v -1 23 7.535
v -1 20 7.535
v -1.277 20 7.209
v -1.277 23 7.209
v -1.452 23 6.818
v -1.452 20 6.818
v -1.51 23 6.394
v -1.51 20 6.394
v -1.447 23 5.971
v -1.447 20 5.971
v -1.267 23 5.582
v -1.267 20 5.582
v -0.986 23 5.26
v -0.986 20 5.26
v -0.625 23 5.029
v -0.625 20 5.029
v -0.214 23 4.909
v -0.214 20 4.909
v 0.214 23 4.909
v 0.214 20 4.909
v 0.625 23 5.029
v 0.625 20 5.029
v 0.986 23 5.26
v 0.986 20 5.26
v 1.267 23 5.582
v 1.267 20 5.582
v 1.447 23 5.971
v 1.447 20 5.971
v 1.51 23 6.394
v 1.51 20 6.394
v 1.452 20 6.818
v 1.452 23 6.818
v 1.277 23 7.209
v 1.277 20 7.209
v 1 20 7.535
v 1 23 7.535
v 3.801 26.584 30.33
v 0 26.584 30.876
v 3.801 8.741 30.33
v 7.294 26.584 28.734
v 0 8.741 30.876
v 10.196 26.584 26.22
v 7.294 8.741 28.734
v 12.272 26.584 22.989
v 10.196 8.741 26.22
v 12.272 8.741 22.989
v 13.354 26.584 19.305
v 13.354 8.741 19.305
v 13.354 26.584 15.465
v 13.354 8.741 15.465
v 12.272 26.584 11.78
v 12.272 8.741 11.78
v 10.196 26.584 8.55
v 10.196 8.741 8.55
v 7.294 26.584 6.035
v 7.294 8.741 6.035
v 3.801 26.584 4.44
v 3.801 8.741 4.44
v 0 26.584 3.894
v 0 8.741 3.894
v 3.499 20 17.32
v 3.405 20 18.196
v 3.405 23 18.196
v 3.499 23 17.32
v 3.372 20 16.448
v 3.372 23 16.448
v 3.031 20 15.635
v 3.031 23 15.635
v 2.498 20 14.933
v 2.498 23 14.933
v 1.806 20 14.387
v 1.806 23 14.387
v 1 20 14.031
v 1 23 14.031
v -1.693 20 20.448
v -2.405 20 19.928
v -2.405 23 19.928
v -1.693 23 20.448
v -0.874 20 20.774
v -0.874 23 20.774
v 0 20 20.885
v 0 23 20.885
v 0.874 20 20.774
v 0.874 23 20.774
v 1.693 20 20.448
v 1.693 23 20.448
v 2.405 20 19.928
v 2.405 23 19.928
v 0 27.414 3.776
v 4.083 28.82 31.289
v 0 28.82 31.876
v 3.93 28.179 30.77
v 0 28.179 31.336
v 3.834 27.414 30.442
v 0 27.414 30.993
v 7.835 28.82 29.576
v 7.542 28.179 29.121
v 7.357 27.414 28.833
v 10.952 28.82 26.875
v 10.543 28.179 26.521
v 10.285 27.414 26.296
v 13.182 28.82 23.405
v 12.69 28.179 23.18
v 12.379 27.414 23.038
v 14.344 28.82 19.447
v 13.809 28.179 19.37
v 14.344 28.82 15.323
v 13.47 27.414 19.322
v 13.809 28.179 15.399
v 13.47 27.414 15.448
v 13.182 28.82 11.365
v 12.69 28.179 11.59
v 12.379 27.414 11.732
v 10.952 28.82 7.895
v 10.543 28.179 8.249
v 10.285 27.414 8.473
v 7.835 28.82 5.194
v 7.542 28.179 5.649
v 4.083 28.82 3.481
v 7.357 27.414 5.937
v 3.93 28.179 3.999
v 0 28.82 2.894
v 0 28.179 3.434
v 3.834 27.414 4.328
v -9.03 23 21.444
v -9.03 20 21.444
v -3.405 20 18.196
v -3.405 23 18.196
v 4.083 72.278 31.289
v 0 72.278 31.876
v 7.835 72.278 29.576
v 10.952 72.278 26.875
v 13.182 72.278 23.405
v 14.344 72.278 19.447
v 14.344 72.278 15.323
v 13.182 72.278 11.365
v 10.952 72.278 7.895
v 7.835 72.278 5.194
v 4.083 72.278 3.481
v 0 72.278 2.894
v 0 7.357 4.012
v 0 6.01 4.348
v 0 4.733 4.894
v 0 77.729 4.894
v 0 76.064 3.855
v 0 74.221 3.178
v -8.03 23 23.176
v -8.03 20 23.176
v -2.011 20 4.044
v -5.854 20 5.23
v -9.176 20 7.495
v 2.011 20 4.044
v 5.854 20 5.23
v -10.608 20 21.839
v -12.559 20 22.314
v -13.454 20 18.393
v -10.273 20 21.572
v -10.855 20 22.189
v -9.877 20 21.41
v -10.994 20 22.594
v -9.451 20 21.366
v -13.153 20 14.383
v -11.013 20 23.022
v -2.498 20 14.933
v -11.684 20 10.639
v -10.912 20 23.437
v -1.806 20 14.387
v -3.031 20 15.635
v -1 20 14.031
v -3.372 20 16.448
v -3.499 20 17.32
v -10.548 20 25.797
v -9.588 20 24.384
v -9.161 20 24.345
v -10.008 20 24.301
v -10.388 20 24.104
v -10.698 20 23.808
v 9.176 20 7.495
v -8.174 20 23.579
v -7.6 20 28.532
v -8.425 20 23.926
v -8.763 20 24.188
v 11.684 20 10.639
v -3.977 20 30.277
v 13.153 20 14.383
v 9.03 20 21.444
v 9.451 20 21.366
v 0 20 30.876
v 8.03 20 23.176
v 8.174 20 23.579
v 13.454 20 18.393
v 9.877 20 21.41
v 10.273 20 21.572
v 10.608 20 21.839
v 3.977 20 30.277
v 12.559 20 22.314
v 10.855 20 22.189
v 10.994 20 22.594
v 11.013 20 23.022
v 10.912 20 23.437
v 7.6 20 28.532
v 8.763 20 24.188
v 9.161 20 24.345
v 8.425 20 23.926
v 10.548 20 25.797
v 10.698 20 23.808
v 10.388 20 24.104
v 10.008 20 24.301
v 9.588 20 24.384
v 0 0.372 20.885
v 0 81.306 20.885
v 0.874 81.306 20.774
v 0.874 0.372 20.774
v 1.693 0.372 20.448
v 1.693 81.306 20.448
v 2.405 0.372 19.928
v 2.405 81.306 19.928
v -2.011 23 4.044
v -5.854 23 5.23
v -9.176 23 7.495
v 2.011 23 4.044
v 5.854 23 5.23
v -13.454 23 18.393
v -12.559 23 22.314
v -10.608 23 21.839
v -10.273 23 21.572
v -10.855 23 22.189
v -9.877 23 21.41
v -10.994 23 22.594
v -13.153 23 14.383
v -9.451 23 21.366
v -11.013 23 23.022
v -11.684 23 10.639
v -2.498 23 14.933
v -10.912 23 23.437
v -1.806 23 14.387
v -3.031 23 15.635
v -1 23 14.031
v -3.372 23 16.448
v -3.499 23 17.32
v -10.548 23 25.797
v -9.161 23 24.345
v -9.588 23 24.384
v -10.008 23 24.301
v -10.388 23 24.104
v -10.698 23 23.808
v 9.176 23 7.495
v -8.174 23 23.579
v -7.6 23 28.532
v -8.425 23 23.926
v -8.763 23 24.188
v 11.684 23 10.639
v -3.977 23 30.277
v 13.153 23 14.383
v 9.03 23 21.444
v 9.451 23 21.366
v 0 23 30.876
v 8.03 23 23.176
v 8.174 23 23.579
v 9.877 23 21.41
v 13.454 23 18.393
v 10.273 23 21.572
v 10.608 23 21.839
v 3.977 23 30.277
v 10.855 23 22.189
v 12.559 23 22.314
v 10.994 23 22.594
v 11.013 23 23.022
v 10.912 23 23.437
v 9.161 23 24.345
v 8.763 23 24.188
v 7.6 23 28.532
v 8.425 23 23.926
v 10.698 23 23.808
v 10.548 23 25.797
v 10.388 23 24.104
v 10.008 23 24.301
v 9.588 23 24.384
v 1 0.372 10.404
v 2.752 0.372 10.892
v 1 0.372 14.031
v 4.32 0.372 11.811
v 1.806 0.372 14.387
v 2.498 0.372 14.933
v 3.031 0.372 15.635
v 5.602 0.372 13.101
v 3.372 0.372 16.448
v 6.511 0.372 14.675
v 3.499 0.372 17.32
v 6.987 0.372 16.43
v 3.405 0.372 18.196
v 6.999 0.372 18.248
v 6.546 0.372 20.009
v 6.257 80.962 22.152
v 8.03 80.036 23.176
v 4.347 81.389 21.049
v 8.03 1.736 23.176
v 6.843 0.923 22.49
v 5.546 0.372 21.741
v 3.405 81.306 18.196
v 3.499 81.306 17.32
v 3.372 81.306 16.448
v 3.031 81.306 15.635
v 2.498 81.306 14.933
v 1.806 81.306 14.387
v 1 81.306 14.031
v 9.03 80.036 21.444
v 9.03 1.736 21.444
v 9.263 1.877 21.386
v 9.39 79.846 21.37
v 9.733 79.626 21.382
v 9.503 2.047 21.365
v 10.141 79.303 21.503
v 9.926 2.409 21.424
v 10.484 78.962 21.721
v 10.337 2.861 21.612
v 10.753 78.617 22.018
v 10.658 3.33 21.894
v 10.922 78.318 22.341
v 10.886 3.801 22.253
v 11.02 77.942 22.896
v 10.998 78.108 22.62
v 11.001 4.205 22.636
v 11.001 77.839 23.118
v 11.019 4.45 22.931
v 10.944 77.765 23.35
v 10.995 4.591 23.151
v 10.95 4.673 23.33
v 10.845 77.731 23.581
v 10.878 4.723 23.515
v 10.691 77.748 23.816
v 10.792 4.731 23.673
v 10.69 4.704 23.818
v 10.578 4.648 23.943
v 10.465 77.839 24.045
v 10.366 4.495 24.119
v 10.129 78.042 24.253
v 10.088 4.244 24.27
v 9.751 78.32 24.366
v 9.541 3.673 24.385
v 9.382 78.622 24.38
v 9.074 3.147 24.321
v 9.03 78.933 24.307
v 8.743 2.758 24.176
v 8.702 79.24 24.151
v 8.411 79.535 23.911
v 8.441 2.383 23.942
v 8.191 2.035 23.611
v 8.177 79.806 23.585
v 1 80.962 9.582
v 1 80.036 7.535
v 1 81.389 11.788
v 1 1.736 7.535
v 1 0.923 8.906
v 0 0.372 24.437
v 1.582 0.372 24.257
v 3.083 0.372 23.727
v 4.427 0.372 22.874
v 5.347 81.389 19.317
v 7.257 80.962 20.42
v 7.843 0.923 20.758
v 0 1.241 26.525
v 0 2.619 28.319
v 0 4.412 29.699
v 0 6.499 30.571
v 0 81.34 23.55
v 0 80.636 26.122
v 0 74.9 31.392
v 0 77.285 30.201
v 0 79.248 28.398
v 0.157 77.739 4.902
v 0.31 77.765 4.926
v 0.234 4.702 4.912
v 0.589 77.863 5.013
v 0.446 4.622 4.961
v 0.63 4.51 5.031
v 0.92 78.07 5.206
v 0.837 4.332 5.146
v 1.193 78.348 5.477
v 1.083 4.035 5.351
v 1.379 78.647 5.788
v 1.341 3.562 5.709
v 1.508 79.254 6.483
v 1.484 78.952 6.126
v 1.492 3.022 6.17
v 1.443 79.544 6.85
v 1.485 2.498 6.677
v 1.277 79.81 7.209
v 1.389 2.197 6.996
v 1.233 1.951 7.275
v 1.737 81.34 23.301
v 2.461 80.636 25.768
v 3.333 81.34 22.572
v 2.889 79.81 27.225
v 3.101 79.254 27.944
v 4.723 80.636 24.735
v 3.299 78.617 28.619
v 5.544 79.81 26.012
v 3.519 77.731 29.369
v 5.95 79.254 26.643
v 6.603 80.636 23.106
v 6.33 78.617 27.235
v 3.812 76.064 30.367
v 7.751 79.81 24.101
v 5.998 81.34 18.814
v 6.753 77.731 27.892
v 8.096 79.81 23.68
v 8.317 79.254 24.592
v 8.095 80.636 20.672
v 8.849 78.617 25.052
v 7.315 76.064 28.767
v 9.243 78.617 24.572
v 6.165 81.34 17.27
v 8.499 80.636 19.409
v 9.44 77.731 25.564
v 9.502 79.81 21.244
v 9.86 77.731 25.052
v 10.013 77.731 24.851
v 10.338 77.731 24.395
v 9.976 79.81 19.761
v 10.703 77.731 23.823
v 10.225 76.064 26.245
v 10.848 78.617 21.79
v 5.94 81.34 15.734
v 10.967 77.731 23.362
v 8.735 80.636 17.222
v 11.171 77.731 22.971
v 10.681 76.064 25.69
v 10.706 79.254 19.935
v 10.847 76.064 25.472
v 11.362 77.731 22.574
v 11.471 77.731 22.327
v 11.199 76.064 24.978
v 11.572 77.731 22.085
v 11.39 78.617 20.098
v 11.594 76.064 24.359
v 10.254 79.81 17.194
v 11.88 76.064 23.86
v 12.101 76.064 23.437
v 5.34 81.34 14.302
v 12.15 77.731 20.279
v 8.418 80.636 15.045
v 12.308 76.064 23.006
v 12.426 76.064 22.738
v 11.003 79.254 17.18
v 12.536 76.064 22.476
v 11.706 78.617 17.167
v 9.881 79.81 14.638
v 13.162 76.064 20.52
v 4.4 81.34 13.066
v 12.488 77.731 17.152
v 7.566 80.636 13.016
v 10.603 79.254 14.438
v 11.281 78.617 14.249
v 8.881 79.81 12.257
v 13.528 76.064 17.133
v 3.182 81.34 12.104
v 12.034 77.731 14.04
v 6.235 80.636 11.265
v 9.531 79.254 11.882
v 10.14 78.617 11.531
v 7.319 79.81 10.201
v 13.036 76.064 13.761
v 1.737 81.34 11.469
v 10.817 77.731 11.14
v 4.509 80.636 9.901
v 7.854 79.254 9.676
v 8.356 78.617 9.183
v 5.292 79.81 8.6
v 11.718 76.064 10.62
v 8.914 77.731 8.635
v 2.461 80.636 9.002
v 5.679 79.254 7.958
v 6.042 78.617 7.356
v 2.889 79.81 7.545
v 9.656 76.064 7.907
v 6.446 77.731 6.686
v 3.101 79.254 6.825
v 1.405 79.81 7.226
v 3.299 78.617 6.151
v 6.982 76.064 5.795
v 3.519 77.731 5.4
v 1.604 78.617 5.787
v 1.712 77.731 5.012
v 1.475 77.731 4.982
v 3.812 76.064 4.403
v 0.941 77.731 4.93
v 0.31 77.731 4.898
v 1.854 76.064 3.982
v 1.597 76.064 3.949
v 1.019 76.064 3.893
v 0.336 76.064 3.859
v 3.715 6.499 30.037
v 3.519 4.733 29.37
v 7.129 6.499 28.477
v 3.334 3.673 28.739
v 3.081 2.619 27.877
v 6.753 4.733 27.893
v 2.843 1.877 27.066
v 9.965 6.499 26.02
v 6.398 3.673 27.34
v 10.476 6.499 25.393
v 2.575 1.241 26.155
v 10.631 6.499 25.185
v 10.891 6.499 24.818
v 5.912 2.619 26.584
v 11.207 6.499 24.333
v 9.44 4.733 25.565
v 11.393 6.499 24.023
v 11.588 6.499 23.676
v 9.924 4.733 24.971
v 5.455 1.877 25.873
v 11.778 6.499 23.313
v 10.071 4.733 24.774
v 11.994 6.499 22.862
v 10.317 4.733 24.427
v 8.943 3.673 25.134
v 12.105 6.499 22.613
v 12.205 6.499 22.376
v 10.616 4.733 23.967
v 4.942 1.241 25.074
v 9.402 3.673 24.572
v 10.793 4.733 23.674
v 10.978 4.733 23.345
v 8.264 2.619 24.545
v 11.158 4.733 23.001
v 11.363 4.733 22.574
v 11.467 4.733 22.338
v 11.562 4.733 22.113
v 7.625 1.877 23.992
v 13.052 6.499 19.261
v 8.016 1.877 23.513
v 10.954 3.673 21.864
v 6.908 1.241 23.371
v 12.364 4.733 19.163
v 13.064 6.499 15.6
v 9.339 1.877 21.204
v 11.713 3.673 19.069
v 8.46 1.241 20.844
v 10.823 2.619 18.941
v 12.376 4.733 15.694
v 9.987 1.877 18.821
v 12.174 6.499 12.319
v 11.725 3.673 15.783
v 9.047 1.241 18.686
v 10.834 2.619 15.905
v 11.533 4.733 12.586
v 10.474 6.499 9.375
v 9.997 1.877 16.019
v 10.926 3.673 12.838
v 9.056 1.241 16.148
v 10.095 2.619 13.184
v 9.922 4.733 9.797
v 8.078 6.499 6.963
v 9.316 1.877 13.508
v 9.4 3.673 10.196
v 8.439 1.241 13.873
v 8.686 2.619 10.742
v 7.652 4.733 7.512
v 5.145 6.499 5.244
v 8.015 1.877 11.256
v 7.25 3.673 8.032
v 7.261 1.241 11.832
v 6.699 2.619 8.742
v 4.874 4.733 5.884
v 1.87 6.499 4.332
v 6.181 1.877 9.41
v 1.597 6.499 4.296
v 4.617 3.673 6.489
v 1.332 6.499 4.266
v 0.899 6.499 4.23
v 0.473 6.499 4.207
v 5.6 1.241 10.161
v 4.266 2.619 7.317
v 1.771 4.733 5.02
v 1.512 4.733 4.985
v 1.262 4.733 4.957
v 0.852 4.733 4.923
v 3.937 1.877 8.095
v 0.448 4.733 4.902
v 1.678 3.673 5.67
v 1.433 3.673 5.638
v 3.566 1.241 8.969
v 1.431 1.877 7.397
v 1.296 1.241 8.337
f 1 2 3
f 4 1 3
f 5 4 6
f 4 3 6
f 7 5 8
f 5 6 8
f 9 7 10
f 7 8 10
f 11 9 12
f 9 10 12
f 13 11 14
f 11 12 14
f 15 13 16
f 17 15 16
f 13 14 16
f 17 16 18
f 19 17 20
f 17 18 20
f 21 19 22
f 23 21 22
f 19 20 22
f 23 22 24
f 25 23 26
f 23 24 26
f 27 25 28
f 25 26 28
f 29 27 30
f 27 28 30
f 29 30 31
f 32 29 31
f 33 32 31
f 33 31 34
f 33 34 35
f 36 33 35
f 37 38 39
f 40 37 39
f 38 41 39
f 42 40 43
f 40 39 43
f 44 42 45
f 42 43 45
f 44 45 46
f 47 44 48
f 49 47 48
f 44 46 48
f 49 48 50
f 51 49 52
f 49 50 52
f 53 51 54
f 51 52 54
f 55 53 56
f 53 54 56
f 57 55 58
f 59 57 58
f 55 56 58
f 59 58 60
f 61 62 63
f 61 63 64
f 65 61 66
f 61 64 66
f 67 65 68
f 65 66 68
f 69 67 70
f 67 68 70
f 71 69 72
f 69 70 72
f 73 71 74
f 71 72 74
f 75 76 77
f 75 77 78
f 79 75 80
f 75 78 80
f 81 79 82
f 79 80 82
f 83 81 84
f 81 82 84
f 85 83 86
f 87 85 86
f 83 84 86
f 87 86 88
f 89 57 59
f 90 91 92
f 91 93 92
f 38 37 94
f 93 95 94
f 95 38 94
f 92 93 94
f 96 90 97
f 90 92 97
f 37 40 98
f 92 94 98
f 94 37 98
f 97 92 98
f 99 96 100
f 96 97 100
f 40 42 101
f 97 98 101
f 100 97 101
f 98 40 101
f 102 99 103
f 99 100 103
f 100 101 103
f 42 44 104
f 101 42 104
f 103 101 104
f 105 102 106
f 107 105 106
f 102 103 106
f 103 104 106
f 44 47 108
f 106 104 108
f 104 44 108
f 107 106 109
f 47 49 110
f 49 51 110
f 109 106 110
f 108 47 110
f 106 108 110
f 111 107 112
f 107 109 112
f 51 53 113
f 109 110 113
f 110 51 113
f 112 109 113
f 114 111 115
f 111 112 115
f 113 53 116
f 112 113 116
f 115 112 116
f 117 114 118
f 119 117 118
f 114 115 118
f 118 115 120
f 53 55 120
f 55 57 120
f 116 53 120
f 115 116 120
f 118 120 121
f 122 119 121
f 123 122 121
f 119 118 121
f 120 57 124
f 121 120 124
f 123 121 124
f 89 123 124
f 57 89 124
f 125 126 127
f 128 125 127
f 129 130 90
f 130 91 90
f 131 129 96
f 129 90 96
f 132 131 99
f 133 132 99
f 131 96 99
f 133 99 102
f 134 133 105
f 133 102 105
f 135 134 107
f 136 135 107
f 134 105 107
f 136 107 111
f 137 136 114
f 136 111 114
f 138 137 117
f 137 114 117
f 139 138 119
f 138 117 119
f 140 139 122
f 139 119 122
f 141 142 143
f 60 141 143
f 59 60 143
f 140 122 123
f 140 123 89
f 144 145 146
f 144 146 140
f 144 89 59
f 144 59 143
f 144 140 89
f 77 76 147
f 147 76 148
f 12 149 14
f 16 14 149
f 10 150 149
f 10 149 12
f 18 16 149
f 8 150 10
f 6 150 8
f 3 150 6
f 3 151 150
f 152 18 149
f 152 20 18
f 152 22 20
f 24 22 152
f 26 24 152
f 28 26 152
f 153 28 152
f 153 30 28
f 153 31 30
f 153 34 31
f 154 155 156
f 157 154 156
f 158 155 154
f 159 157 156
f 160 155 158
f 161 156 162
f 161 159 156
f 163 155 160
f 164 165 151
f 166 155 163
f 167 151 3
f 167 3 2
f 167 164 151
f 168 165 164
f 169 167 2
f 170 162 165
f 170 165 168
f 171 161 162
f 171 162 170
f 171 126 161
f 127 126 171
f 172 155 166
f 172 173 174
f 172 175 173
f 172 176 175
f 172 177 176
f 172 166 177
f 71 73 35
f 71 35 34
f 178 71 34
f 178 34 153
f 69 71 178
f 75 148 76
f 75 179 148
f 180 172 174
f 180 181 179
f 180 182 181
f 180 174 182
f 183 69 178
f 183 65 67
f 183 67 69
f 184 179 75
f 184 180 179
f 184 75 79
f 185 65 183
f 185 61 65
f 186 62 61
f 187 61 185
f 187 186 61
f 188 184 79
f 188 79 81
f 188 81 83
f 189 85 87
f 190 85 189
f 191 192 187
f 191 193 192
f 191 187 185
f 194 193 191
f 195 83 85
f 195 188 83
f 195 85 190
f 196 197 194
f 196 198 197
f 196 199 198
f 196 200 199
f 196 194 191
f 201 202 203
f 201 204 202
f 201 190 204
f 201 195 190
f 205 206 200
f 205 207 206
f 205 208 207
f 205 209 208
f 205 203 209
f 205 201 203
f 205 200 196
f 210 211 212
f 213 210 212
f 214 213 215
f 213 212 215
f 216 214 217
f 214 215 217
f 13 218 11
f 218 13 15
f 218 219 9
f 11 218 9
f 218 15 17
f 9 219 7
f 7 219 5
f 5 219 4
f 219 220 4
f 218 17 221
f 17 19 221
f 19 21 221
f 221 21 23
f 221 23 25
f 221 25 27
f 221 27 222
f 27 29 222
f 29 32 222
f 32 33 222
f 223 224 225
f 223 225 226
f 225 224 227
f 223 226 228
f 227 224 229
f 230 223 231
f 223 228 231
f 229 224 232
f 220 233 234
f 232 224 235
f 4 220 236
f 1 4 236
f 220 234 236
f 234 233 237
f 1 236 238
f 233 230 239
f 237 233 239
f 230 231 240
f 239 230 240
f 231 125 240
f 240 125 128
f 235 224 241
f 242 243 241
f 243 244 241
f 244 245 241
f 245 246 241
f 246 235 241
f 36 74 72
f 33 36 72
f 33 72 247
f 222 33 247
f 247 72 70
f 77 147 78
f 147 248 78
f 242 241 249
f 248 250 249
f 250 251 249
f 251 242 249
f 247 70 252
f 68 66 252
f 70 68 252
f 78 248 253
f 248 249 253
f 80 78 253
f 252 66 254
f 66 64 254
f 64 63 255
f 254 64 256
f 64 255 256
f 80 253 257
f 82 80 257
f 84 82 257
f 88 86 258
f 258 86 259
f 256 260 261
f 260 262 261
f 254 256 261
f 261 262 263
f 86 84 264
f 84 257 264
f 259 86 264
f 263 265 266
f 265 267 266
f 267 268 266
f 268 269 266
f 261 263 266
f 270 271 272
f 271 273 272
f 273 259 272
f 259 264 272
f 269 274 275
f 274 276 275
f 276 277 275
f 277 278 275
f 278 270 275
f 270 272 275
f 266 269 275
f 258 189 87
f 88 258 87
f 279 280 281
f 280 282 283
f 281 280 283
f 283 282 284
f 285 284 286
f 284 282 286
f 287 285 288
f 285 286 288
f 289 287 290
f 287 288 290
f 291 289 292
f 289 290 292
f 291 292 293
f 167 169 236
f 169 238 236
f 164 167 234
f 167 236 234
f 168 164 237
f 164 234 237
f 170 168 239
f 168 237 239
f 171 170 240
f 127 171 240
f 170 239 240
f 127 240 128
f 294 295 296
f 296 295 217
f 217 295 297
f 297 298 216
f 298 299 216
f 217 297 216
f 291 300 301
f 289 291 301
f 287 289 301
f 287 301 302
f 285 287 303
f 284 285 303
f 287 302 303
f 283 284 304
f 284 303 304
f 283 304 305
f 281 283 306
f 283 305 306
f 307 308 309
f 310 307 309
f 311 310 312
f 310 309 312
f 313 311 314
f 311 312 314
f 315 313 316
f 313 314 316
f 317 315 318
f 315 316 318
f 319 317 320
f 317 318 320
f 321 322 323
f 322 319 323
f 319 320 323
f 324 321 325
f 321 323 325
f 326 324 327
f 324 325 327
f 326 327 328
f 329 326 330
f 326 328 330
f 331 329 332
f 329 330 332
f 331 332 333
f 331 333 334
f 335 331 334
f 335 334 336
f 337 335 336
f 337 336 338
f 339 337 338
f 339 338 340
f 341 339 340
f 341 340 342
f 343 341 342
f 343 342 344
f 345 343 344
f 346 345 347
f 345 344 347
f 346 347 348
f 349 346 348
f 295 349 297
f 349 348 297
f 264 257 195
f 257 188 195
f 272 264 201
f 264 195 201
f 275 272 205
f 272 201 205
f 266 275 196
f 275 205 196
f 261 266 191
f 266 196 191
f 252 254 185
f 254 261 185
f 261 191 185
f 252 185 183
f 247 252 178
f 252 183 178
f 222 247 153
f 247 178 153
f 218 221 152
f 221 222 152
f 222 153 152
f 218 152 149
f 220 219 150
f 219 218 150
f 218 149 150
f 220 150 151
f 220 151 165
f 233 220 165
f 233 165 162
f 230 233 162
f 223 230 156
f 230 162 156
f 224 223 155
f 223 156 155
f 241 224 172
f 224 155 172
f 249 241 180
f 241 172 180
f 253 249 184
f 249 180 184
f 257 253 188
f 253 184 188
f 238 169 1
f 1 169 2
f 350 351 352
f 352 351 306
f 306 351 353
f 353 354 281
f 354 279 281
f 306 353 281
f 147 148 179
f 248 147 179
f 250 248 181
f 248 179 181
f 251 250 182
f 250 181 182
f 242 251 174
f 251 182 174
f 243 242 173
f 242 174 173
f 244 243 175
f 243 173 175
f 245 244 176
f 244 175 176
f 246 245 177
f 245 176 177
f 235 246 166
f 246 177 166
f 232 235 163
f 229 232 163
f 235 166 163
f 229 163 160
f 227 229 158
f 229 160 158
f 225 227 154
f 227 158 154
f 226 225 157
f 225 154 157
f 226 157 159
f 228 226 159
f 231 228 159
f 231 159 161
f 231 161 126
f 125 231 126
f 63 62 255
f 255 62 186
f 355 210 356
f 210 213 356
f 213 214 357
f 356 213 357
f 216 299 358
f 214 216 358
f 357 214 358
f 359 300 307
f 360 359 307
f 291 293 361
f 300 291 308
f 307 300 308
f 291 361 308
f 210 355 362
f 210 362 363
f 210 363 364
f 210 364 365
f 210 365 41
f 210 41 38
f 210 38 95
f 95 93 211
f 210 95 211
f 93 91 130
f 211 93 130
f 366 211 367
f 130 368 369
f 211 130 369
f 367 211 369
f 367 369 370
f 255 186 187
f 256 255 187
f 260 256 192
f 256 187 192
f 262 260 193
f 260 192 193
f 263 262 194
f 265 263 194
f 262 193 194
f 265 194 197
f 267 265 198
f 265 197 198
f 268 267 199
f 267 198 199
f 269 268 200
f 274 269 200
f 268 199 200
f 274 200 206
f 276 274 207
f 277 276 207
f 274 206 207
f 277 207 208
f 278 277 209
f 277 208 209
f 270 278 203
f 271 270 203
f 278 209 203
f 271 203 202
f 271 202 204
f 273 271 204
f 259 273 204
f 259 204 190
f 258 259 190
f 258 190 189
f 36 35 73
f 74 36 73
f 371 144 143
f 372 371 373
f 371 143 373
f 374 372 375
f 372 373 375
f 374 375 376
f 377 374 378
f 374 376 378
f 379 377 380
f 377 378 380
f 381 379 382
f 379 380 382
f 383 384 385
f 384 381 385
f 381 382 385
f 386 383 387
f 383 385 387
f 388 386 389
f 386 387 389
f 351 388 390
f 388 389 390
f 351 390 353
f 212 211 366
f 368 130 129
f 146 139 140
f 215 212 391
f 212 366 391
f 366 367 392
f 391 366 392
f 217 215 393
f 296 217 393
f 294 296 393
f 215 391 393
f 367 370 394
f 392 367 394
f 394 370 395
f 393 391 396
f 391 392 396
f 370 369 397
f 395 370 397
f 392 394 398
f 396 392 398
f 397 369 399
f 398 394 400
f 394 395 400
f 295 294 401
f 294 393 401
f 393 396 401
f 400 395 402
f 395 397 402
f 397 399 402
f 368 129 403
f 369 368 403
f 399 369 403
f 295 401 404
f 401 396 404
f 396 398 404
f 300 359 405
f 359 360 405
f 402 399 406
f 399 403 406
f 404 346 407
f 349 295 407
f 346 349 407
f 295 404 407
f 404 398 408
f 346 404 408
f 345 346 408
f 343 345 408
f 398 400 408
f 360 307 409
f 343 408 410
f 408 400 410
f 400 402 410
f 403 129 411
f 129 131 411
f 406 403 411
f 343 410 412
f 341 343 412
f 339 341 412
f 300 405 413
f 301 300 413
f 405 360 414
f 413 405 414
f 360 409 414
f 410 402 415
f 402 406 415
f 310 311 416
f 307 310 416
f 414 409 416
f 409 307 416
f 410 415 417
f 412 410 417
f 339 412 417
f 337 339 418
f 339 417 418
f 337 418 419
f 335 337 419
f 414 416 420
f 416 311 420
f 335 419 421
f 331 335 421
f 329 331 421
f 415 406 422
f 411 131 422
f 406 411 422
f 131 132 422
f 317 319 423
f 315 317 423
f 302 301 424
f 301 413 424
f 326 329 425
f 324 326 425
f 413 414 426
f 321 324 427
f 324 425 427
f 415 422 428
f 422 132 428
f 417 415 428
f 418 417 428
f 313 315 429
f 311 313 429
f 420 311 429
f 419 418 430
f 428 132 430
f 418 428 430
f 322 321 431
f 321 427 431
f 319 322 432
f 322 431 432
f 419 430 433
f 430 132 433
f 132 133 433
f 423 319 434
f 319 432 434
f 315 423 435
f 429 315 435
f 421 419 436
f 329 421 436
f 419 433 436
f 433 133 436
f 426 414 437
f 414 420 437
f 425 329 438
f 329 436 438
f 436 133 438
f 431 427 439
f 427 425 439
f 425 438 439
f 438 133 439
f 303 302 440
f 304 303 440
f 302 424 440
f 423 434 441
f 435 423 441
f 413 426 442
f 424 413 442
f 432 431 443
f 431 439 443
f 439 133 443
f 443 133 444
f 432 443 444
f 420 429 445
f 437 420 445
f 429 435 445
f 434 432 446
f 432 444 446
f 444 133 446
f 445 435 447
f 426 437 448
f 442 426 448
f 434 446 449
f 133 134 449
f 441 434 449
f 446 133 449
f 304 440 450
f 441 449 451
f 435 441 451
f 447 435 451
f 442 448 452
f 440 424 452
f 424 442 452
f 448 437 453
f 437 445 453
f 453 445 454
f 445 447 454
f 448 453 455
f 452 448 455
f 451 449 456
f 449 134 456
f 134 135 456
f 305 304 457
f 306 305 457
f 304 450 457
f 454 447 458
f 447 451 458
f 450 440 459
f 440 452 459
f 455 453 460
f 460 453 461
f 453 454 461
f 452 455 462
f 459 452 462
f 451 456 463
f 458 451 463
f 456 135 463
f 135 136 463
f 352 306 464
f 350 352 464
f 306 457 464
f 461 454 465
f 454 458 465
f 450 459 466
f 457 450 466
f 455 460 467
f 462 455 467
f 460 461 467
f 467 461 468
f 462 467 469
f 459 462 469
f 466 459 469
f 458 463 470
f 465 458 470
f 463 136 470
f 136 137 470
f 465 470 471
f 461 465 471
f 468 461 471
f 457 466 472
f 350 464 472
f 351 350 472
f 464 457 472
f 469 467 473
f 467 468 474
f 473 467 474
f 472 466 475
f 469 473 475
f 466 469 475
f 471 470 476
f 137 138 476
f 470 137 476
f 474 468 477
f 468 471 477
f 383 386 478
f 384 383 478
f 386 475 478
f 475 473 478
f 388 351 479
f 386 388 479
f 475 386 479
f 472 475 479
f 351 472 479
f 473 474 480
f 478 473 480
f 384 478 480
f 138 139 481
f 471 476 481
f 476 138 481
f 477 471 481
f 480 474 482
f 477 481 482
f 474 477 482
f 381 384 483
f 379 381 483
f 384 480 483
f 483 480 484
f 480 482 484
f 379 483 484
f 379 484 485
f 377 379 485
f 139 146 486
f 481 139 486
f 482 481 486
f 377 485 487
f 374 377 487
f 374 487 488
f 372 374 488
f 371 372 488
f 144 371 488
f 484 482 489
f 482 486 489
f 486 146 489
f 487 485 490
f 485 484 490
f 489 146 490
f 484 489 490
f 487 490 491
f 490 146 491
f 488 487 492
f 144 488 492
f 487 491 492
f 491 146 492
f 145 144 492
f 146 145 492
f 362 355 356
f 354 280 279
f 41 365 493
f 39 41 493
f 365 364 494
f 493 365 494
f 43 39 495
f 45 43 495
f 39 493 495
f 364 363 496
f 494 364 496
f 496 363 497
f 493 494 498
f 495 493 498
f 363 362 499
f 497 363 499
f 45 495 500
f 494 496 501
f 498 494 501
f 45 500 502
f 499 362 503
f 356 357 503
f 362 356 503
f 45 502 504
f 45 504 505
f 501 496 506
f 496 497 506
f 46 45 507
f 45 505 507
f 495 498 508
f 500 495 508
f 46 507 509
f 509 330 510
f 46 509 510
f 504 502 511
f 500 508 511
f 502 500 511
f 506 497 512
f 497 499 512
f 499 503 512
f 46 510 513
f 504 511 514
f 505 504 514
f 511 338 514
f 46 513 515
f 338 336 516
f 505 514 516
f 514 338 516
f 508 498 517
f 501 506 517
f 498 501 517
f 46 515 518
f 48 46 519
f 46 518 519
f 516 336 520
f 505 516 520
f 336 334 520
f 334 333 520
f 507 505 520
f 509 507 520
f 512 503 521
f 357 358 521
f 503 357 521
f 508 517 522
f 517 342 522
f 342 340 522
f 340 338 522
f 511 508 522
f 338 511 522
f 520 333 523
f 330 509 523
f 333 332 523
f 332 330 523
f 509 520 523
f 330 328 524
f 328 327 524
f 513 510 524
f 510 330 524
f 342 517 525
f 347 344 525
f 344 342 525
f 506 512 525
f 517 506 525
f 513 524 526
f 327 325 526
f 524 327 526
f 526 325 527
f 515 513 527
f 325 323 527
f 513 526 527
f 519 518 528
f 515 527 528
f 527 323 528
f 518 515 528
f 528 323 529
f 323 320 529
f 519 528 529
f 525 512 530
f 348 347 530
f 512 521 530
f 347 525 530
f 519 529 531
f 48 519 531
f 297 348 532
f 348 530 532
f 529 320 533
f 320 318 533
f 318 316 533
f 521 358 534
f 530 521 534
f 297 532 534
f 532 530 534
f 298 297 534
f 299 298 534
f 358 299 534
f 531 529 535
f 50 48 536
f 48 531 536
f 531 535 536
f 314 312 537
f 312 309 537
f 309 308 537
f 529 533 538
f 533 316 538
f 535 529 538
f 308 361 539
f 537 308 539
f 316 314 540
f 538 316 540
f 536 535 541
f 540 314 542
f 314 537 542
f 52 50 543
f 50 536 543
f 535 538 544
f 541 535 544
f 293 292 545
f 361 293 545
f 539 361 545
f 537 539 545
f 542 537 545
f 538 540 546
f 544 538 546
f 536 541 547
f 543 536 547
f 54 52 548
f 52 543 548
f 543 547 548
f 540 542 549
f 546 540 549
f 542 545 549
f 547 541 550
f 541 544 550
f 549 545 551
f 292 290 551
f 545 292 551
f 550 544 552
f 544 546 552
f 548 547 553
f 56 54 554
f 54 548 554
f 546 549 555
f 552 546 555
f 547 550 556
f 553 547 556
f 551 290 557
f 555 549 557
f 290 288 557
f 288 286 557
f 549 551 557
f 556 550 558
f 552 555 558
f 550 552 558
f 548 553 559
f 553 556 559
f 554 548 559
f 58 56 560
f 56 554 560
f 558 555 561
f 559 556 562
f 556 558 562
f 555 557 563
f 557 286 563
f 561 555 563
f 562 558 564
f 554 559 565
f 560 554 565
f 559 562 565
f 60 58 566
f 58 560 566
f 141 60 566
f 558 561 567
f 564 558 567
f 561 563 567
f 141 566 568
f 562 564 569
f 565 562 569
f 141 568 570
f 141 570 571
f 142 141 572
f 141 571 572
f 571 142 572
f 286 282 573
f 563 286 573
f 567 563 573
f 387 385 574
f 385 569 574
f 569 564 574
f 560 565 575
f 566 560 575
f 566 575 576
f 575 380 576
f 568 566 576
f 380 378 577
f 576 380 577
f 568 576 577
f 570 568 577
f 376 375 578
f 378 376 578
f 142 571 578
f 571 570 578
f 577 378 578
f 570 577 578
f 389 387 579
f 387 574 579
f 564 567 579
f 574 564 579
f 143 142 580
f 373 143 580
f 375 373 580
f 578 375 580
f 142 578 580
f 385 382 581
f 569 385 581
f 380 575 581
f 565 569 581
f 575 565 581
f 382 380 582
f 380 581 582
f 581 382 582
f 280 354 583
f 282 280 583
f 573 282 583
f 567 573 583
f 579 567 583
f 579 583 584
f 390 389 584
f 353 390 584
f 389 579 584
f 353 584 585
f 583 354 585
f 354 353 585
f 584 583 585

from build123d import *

# Parameters (mm, degrees)
F4_ANGLE  = 180
F6_DEPTH  = 90
F8_COUNT  = 3
F12_START = -20
F11_R     = 13.4913344195
F12_DEPTH = 3


with BuildPart() as f4:
    # F3 (on Right) → F4 (revolve)
    with BuildSketch(Plane.YZ):
        with BuildLine():
            Line((0.3716222048, 20.884835436), (81.3056033368, 20.884835436))
            ThreePointArc((81.3056033368, 20.884835436), (79.2480851868, 28.3977219469), (72.2783456923, 31.8761664331))
            Line((72.2783456923, 31.8761664331), (28.8201148927, 31.8761664331))
            ThreePointArc((28.8201148927, 31.8761664331), (27.8087917866, 31.1375536456), (26.5840469152, 30.8761664331))
            Line((26.5840469152, 30.8761664331), (8.8330505692, 30.8761664331))
            Line((8.8330505692, 30.8761664331), (8.7405150061, 30.8761664331))
            ThreePointArc((8.7405150061, 30.8761664331), (3.470465515, 29.0675325384), (0.3716222048, 24.4370089889))
            Line((0.3716222048, 24.4370089889), (0.3716222048, 20.884835436))
        make_face()
    revolve(axis=Axis((0, 40.3716222048, 17.384835436), (0, 1, 0)), revolution_arc=F4_ANGLE)


with BuildPart() as f6:
    # F5 (on Front) → F6 (new body)
    with BuildSketch(Plane.XZ):
        with BuildLine():
            ThreePointArc((1, 14.0307334698), (0, 13.884835436), (-1, 14.0307334698))
            Line((-1, 14.0307334698), (-1, 7.5353520725))
            ThreePointArc((-1, 7.5353520725), (0, 4.893504439), (1, 7.5353520725))
            Line((1, 7.5353520725), (1, 14.0307334698))
        make_face()
    extrude(amount=-F6_DEPTH)


with BuildPart() as f8_1:
    # F8: instance of F6
    add(f6.part.rotate(Axis((0, 20.536005497, 17.384835436), (0, 1, 0)), 1 * 360 / F8_COUNT))


with BuildPart() as f8_2:
    # F8: instance of F6
    add(f6.part.rotate(Axis((0, 20.536005497, 17.384835436), (0, 1, 0)), 2 * 360 / F8_COUNT))


with BuildPart() as f4_1:
    add(f4.part)

    # F9: cut F6, F8_2
    add(f6.part, mode=Mode.SUBTRACT)
    add(f8_2.part, mode=Mode.SUBTRACT)


with BuildPart() as f10:
    # F3 (on Right) → F10 (revolve)
    with BuildSketch(Plane.YZ):
        with BuildLine():
            Line((0.3716222048, 20.884835436), (81.3056033368, 20.884835436))
            ThreePointArc((81.3056033368, 20.884835436), (79.2480851868, 28.3977219469), (72.2783456923, 31.8761664331))
            Line((72.2783456923, 31.8761664331), (28.8201148927, 31.8761664331))
            ThreePointArc((28.8201148927, 31.8761664331), (27.8087917866, 31.1375536456), (26.5840469152, 30.8761664331))
            Line((26.5840469152, 30.8761664331), (8.8330505692, 30.8761664331))
            Line((8.8330505692, 30.8761664331), (8.7405150061, 30.8761664331))
            ThreePointArc((8.7405150061, 30.8761664331), (3.470465515, 29.0675325384), (0.3716222048, 24.4370089889))
            Line((0.3716222048, 24.4370089889), (0.3716222048, 20.884835436))
        make_face()
    revolve(axis=Axis((0, 40.3716222048, 17.384835436), (0, 1, 0)))

    # F13: cut F6, F8_2, F8_1
    add(f6.part, mode=Mode.SUBTRACT)
    add(f8_2.part, mode=Mode.SUBTRACT)
    add(f8_1.part, mode=Mode.SUBTRACT)


with BuildPart() as f12:
    # F11 (on Front) → F12 (new body)
    with BuildSketch(Plane.XZ.offset(F12_START)):
        with Locations((0, 17.384835436)):
            Circle(F11_R)
    extrude(amount=-F12_DEPTH)


with BuildPart() as f10_1:
    add(f10.part)

    # F14: intersect F12
    add(f12.part, mode=Mode.INTERSECT)


solid = Compound([f4_1.part, f10_1.part])
